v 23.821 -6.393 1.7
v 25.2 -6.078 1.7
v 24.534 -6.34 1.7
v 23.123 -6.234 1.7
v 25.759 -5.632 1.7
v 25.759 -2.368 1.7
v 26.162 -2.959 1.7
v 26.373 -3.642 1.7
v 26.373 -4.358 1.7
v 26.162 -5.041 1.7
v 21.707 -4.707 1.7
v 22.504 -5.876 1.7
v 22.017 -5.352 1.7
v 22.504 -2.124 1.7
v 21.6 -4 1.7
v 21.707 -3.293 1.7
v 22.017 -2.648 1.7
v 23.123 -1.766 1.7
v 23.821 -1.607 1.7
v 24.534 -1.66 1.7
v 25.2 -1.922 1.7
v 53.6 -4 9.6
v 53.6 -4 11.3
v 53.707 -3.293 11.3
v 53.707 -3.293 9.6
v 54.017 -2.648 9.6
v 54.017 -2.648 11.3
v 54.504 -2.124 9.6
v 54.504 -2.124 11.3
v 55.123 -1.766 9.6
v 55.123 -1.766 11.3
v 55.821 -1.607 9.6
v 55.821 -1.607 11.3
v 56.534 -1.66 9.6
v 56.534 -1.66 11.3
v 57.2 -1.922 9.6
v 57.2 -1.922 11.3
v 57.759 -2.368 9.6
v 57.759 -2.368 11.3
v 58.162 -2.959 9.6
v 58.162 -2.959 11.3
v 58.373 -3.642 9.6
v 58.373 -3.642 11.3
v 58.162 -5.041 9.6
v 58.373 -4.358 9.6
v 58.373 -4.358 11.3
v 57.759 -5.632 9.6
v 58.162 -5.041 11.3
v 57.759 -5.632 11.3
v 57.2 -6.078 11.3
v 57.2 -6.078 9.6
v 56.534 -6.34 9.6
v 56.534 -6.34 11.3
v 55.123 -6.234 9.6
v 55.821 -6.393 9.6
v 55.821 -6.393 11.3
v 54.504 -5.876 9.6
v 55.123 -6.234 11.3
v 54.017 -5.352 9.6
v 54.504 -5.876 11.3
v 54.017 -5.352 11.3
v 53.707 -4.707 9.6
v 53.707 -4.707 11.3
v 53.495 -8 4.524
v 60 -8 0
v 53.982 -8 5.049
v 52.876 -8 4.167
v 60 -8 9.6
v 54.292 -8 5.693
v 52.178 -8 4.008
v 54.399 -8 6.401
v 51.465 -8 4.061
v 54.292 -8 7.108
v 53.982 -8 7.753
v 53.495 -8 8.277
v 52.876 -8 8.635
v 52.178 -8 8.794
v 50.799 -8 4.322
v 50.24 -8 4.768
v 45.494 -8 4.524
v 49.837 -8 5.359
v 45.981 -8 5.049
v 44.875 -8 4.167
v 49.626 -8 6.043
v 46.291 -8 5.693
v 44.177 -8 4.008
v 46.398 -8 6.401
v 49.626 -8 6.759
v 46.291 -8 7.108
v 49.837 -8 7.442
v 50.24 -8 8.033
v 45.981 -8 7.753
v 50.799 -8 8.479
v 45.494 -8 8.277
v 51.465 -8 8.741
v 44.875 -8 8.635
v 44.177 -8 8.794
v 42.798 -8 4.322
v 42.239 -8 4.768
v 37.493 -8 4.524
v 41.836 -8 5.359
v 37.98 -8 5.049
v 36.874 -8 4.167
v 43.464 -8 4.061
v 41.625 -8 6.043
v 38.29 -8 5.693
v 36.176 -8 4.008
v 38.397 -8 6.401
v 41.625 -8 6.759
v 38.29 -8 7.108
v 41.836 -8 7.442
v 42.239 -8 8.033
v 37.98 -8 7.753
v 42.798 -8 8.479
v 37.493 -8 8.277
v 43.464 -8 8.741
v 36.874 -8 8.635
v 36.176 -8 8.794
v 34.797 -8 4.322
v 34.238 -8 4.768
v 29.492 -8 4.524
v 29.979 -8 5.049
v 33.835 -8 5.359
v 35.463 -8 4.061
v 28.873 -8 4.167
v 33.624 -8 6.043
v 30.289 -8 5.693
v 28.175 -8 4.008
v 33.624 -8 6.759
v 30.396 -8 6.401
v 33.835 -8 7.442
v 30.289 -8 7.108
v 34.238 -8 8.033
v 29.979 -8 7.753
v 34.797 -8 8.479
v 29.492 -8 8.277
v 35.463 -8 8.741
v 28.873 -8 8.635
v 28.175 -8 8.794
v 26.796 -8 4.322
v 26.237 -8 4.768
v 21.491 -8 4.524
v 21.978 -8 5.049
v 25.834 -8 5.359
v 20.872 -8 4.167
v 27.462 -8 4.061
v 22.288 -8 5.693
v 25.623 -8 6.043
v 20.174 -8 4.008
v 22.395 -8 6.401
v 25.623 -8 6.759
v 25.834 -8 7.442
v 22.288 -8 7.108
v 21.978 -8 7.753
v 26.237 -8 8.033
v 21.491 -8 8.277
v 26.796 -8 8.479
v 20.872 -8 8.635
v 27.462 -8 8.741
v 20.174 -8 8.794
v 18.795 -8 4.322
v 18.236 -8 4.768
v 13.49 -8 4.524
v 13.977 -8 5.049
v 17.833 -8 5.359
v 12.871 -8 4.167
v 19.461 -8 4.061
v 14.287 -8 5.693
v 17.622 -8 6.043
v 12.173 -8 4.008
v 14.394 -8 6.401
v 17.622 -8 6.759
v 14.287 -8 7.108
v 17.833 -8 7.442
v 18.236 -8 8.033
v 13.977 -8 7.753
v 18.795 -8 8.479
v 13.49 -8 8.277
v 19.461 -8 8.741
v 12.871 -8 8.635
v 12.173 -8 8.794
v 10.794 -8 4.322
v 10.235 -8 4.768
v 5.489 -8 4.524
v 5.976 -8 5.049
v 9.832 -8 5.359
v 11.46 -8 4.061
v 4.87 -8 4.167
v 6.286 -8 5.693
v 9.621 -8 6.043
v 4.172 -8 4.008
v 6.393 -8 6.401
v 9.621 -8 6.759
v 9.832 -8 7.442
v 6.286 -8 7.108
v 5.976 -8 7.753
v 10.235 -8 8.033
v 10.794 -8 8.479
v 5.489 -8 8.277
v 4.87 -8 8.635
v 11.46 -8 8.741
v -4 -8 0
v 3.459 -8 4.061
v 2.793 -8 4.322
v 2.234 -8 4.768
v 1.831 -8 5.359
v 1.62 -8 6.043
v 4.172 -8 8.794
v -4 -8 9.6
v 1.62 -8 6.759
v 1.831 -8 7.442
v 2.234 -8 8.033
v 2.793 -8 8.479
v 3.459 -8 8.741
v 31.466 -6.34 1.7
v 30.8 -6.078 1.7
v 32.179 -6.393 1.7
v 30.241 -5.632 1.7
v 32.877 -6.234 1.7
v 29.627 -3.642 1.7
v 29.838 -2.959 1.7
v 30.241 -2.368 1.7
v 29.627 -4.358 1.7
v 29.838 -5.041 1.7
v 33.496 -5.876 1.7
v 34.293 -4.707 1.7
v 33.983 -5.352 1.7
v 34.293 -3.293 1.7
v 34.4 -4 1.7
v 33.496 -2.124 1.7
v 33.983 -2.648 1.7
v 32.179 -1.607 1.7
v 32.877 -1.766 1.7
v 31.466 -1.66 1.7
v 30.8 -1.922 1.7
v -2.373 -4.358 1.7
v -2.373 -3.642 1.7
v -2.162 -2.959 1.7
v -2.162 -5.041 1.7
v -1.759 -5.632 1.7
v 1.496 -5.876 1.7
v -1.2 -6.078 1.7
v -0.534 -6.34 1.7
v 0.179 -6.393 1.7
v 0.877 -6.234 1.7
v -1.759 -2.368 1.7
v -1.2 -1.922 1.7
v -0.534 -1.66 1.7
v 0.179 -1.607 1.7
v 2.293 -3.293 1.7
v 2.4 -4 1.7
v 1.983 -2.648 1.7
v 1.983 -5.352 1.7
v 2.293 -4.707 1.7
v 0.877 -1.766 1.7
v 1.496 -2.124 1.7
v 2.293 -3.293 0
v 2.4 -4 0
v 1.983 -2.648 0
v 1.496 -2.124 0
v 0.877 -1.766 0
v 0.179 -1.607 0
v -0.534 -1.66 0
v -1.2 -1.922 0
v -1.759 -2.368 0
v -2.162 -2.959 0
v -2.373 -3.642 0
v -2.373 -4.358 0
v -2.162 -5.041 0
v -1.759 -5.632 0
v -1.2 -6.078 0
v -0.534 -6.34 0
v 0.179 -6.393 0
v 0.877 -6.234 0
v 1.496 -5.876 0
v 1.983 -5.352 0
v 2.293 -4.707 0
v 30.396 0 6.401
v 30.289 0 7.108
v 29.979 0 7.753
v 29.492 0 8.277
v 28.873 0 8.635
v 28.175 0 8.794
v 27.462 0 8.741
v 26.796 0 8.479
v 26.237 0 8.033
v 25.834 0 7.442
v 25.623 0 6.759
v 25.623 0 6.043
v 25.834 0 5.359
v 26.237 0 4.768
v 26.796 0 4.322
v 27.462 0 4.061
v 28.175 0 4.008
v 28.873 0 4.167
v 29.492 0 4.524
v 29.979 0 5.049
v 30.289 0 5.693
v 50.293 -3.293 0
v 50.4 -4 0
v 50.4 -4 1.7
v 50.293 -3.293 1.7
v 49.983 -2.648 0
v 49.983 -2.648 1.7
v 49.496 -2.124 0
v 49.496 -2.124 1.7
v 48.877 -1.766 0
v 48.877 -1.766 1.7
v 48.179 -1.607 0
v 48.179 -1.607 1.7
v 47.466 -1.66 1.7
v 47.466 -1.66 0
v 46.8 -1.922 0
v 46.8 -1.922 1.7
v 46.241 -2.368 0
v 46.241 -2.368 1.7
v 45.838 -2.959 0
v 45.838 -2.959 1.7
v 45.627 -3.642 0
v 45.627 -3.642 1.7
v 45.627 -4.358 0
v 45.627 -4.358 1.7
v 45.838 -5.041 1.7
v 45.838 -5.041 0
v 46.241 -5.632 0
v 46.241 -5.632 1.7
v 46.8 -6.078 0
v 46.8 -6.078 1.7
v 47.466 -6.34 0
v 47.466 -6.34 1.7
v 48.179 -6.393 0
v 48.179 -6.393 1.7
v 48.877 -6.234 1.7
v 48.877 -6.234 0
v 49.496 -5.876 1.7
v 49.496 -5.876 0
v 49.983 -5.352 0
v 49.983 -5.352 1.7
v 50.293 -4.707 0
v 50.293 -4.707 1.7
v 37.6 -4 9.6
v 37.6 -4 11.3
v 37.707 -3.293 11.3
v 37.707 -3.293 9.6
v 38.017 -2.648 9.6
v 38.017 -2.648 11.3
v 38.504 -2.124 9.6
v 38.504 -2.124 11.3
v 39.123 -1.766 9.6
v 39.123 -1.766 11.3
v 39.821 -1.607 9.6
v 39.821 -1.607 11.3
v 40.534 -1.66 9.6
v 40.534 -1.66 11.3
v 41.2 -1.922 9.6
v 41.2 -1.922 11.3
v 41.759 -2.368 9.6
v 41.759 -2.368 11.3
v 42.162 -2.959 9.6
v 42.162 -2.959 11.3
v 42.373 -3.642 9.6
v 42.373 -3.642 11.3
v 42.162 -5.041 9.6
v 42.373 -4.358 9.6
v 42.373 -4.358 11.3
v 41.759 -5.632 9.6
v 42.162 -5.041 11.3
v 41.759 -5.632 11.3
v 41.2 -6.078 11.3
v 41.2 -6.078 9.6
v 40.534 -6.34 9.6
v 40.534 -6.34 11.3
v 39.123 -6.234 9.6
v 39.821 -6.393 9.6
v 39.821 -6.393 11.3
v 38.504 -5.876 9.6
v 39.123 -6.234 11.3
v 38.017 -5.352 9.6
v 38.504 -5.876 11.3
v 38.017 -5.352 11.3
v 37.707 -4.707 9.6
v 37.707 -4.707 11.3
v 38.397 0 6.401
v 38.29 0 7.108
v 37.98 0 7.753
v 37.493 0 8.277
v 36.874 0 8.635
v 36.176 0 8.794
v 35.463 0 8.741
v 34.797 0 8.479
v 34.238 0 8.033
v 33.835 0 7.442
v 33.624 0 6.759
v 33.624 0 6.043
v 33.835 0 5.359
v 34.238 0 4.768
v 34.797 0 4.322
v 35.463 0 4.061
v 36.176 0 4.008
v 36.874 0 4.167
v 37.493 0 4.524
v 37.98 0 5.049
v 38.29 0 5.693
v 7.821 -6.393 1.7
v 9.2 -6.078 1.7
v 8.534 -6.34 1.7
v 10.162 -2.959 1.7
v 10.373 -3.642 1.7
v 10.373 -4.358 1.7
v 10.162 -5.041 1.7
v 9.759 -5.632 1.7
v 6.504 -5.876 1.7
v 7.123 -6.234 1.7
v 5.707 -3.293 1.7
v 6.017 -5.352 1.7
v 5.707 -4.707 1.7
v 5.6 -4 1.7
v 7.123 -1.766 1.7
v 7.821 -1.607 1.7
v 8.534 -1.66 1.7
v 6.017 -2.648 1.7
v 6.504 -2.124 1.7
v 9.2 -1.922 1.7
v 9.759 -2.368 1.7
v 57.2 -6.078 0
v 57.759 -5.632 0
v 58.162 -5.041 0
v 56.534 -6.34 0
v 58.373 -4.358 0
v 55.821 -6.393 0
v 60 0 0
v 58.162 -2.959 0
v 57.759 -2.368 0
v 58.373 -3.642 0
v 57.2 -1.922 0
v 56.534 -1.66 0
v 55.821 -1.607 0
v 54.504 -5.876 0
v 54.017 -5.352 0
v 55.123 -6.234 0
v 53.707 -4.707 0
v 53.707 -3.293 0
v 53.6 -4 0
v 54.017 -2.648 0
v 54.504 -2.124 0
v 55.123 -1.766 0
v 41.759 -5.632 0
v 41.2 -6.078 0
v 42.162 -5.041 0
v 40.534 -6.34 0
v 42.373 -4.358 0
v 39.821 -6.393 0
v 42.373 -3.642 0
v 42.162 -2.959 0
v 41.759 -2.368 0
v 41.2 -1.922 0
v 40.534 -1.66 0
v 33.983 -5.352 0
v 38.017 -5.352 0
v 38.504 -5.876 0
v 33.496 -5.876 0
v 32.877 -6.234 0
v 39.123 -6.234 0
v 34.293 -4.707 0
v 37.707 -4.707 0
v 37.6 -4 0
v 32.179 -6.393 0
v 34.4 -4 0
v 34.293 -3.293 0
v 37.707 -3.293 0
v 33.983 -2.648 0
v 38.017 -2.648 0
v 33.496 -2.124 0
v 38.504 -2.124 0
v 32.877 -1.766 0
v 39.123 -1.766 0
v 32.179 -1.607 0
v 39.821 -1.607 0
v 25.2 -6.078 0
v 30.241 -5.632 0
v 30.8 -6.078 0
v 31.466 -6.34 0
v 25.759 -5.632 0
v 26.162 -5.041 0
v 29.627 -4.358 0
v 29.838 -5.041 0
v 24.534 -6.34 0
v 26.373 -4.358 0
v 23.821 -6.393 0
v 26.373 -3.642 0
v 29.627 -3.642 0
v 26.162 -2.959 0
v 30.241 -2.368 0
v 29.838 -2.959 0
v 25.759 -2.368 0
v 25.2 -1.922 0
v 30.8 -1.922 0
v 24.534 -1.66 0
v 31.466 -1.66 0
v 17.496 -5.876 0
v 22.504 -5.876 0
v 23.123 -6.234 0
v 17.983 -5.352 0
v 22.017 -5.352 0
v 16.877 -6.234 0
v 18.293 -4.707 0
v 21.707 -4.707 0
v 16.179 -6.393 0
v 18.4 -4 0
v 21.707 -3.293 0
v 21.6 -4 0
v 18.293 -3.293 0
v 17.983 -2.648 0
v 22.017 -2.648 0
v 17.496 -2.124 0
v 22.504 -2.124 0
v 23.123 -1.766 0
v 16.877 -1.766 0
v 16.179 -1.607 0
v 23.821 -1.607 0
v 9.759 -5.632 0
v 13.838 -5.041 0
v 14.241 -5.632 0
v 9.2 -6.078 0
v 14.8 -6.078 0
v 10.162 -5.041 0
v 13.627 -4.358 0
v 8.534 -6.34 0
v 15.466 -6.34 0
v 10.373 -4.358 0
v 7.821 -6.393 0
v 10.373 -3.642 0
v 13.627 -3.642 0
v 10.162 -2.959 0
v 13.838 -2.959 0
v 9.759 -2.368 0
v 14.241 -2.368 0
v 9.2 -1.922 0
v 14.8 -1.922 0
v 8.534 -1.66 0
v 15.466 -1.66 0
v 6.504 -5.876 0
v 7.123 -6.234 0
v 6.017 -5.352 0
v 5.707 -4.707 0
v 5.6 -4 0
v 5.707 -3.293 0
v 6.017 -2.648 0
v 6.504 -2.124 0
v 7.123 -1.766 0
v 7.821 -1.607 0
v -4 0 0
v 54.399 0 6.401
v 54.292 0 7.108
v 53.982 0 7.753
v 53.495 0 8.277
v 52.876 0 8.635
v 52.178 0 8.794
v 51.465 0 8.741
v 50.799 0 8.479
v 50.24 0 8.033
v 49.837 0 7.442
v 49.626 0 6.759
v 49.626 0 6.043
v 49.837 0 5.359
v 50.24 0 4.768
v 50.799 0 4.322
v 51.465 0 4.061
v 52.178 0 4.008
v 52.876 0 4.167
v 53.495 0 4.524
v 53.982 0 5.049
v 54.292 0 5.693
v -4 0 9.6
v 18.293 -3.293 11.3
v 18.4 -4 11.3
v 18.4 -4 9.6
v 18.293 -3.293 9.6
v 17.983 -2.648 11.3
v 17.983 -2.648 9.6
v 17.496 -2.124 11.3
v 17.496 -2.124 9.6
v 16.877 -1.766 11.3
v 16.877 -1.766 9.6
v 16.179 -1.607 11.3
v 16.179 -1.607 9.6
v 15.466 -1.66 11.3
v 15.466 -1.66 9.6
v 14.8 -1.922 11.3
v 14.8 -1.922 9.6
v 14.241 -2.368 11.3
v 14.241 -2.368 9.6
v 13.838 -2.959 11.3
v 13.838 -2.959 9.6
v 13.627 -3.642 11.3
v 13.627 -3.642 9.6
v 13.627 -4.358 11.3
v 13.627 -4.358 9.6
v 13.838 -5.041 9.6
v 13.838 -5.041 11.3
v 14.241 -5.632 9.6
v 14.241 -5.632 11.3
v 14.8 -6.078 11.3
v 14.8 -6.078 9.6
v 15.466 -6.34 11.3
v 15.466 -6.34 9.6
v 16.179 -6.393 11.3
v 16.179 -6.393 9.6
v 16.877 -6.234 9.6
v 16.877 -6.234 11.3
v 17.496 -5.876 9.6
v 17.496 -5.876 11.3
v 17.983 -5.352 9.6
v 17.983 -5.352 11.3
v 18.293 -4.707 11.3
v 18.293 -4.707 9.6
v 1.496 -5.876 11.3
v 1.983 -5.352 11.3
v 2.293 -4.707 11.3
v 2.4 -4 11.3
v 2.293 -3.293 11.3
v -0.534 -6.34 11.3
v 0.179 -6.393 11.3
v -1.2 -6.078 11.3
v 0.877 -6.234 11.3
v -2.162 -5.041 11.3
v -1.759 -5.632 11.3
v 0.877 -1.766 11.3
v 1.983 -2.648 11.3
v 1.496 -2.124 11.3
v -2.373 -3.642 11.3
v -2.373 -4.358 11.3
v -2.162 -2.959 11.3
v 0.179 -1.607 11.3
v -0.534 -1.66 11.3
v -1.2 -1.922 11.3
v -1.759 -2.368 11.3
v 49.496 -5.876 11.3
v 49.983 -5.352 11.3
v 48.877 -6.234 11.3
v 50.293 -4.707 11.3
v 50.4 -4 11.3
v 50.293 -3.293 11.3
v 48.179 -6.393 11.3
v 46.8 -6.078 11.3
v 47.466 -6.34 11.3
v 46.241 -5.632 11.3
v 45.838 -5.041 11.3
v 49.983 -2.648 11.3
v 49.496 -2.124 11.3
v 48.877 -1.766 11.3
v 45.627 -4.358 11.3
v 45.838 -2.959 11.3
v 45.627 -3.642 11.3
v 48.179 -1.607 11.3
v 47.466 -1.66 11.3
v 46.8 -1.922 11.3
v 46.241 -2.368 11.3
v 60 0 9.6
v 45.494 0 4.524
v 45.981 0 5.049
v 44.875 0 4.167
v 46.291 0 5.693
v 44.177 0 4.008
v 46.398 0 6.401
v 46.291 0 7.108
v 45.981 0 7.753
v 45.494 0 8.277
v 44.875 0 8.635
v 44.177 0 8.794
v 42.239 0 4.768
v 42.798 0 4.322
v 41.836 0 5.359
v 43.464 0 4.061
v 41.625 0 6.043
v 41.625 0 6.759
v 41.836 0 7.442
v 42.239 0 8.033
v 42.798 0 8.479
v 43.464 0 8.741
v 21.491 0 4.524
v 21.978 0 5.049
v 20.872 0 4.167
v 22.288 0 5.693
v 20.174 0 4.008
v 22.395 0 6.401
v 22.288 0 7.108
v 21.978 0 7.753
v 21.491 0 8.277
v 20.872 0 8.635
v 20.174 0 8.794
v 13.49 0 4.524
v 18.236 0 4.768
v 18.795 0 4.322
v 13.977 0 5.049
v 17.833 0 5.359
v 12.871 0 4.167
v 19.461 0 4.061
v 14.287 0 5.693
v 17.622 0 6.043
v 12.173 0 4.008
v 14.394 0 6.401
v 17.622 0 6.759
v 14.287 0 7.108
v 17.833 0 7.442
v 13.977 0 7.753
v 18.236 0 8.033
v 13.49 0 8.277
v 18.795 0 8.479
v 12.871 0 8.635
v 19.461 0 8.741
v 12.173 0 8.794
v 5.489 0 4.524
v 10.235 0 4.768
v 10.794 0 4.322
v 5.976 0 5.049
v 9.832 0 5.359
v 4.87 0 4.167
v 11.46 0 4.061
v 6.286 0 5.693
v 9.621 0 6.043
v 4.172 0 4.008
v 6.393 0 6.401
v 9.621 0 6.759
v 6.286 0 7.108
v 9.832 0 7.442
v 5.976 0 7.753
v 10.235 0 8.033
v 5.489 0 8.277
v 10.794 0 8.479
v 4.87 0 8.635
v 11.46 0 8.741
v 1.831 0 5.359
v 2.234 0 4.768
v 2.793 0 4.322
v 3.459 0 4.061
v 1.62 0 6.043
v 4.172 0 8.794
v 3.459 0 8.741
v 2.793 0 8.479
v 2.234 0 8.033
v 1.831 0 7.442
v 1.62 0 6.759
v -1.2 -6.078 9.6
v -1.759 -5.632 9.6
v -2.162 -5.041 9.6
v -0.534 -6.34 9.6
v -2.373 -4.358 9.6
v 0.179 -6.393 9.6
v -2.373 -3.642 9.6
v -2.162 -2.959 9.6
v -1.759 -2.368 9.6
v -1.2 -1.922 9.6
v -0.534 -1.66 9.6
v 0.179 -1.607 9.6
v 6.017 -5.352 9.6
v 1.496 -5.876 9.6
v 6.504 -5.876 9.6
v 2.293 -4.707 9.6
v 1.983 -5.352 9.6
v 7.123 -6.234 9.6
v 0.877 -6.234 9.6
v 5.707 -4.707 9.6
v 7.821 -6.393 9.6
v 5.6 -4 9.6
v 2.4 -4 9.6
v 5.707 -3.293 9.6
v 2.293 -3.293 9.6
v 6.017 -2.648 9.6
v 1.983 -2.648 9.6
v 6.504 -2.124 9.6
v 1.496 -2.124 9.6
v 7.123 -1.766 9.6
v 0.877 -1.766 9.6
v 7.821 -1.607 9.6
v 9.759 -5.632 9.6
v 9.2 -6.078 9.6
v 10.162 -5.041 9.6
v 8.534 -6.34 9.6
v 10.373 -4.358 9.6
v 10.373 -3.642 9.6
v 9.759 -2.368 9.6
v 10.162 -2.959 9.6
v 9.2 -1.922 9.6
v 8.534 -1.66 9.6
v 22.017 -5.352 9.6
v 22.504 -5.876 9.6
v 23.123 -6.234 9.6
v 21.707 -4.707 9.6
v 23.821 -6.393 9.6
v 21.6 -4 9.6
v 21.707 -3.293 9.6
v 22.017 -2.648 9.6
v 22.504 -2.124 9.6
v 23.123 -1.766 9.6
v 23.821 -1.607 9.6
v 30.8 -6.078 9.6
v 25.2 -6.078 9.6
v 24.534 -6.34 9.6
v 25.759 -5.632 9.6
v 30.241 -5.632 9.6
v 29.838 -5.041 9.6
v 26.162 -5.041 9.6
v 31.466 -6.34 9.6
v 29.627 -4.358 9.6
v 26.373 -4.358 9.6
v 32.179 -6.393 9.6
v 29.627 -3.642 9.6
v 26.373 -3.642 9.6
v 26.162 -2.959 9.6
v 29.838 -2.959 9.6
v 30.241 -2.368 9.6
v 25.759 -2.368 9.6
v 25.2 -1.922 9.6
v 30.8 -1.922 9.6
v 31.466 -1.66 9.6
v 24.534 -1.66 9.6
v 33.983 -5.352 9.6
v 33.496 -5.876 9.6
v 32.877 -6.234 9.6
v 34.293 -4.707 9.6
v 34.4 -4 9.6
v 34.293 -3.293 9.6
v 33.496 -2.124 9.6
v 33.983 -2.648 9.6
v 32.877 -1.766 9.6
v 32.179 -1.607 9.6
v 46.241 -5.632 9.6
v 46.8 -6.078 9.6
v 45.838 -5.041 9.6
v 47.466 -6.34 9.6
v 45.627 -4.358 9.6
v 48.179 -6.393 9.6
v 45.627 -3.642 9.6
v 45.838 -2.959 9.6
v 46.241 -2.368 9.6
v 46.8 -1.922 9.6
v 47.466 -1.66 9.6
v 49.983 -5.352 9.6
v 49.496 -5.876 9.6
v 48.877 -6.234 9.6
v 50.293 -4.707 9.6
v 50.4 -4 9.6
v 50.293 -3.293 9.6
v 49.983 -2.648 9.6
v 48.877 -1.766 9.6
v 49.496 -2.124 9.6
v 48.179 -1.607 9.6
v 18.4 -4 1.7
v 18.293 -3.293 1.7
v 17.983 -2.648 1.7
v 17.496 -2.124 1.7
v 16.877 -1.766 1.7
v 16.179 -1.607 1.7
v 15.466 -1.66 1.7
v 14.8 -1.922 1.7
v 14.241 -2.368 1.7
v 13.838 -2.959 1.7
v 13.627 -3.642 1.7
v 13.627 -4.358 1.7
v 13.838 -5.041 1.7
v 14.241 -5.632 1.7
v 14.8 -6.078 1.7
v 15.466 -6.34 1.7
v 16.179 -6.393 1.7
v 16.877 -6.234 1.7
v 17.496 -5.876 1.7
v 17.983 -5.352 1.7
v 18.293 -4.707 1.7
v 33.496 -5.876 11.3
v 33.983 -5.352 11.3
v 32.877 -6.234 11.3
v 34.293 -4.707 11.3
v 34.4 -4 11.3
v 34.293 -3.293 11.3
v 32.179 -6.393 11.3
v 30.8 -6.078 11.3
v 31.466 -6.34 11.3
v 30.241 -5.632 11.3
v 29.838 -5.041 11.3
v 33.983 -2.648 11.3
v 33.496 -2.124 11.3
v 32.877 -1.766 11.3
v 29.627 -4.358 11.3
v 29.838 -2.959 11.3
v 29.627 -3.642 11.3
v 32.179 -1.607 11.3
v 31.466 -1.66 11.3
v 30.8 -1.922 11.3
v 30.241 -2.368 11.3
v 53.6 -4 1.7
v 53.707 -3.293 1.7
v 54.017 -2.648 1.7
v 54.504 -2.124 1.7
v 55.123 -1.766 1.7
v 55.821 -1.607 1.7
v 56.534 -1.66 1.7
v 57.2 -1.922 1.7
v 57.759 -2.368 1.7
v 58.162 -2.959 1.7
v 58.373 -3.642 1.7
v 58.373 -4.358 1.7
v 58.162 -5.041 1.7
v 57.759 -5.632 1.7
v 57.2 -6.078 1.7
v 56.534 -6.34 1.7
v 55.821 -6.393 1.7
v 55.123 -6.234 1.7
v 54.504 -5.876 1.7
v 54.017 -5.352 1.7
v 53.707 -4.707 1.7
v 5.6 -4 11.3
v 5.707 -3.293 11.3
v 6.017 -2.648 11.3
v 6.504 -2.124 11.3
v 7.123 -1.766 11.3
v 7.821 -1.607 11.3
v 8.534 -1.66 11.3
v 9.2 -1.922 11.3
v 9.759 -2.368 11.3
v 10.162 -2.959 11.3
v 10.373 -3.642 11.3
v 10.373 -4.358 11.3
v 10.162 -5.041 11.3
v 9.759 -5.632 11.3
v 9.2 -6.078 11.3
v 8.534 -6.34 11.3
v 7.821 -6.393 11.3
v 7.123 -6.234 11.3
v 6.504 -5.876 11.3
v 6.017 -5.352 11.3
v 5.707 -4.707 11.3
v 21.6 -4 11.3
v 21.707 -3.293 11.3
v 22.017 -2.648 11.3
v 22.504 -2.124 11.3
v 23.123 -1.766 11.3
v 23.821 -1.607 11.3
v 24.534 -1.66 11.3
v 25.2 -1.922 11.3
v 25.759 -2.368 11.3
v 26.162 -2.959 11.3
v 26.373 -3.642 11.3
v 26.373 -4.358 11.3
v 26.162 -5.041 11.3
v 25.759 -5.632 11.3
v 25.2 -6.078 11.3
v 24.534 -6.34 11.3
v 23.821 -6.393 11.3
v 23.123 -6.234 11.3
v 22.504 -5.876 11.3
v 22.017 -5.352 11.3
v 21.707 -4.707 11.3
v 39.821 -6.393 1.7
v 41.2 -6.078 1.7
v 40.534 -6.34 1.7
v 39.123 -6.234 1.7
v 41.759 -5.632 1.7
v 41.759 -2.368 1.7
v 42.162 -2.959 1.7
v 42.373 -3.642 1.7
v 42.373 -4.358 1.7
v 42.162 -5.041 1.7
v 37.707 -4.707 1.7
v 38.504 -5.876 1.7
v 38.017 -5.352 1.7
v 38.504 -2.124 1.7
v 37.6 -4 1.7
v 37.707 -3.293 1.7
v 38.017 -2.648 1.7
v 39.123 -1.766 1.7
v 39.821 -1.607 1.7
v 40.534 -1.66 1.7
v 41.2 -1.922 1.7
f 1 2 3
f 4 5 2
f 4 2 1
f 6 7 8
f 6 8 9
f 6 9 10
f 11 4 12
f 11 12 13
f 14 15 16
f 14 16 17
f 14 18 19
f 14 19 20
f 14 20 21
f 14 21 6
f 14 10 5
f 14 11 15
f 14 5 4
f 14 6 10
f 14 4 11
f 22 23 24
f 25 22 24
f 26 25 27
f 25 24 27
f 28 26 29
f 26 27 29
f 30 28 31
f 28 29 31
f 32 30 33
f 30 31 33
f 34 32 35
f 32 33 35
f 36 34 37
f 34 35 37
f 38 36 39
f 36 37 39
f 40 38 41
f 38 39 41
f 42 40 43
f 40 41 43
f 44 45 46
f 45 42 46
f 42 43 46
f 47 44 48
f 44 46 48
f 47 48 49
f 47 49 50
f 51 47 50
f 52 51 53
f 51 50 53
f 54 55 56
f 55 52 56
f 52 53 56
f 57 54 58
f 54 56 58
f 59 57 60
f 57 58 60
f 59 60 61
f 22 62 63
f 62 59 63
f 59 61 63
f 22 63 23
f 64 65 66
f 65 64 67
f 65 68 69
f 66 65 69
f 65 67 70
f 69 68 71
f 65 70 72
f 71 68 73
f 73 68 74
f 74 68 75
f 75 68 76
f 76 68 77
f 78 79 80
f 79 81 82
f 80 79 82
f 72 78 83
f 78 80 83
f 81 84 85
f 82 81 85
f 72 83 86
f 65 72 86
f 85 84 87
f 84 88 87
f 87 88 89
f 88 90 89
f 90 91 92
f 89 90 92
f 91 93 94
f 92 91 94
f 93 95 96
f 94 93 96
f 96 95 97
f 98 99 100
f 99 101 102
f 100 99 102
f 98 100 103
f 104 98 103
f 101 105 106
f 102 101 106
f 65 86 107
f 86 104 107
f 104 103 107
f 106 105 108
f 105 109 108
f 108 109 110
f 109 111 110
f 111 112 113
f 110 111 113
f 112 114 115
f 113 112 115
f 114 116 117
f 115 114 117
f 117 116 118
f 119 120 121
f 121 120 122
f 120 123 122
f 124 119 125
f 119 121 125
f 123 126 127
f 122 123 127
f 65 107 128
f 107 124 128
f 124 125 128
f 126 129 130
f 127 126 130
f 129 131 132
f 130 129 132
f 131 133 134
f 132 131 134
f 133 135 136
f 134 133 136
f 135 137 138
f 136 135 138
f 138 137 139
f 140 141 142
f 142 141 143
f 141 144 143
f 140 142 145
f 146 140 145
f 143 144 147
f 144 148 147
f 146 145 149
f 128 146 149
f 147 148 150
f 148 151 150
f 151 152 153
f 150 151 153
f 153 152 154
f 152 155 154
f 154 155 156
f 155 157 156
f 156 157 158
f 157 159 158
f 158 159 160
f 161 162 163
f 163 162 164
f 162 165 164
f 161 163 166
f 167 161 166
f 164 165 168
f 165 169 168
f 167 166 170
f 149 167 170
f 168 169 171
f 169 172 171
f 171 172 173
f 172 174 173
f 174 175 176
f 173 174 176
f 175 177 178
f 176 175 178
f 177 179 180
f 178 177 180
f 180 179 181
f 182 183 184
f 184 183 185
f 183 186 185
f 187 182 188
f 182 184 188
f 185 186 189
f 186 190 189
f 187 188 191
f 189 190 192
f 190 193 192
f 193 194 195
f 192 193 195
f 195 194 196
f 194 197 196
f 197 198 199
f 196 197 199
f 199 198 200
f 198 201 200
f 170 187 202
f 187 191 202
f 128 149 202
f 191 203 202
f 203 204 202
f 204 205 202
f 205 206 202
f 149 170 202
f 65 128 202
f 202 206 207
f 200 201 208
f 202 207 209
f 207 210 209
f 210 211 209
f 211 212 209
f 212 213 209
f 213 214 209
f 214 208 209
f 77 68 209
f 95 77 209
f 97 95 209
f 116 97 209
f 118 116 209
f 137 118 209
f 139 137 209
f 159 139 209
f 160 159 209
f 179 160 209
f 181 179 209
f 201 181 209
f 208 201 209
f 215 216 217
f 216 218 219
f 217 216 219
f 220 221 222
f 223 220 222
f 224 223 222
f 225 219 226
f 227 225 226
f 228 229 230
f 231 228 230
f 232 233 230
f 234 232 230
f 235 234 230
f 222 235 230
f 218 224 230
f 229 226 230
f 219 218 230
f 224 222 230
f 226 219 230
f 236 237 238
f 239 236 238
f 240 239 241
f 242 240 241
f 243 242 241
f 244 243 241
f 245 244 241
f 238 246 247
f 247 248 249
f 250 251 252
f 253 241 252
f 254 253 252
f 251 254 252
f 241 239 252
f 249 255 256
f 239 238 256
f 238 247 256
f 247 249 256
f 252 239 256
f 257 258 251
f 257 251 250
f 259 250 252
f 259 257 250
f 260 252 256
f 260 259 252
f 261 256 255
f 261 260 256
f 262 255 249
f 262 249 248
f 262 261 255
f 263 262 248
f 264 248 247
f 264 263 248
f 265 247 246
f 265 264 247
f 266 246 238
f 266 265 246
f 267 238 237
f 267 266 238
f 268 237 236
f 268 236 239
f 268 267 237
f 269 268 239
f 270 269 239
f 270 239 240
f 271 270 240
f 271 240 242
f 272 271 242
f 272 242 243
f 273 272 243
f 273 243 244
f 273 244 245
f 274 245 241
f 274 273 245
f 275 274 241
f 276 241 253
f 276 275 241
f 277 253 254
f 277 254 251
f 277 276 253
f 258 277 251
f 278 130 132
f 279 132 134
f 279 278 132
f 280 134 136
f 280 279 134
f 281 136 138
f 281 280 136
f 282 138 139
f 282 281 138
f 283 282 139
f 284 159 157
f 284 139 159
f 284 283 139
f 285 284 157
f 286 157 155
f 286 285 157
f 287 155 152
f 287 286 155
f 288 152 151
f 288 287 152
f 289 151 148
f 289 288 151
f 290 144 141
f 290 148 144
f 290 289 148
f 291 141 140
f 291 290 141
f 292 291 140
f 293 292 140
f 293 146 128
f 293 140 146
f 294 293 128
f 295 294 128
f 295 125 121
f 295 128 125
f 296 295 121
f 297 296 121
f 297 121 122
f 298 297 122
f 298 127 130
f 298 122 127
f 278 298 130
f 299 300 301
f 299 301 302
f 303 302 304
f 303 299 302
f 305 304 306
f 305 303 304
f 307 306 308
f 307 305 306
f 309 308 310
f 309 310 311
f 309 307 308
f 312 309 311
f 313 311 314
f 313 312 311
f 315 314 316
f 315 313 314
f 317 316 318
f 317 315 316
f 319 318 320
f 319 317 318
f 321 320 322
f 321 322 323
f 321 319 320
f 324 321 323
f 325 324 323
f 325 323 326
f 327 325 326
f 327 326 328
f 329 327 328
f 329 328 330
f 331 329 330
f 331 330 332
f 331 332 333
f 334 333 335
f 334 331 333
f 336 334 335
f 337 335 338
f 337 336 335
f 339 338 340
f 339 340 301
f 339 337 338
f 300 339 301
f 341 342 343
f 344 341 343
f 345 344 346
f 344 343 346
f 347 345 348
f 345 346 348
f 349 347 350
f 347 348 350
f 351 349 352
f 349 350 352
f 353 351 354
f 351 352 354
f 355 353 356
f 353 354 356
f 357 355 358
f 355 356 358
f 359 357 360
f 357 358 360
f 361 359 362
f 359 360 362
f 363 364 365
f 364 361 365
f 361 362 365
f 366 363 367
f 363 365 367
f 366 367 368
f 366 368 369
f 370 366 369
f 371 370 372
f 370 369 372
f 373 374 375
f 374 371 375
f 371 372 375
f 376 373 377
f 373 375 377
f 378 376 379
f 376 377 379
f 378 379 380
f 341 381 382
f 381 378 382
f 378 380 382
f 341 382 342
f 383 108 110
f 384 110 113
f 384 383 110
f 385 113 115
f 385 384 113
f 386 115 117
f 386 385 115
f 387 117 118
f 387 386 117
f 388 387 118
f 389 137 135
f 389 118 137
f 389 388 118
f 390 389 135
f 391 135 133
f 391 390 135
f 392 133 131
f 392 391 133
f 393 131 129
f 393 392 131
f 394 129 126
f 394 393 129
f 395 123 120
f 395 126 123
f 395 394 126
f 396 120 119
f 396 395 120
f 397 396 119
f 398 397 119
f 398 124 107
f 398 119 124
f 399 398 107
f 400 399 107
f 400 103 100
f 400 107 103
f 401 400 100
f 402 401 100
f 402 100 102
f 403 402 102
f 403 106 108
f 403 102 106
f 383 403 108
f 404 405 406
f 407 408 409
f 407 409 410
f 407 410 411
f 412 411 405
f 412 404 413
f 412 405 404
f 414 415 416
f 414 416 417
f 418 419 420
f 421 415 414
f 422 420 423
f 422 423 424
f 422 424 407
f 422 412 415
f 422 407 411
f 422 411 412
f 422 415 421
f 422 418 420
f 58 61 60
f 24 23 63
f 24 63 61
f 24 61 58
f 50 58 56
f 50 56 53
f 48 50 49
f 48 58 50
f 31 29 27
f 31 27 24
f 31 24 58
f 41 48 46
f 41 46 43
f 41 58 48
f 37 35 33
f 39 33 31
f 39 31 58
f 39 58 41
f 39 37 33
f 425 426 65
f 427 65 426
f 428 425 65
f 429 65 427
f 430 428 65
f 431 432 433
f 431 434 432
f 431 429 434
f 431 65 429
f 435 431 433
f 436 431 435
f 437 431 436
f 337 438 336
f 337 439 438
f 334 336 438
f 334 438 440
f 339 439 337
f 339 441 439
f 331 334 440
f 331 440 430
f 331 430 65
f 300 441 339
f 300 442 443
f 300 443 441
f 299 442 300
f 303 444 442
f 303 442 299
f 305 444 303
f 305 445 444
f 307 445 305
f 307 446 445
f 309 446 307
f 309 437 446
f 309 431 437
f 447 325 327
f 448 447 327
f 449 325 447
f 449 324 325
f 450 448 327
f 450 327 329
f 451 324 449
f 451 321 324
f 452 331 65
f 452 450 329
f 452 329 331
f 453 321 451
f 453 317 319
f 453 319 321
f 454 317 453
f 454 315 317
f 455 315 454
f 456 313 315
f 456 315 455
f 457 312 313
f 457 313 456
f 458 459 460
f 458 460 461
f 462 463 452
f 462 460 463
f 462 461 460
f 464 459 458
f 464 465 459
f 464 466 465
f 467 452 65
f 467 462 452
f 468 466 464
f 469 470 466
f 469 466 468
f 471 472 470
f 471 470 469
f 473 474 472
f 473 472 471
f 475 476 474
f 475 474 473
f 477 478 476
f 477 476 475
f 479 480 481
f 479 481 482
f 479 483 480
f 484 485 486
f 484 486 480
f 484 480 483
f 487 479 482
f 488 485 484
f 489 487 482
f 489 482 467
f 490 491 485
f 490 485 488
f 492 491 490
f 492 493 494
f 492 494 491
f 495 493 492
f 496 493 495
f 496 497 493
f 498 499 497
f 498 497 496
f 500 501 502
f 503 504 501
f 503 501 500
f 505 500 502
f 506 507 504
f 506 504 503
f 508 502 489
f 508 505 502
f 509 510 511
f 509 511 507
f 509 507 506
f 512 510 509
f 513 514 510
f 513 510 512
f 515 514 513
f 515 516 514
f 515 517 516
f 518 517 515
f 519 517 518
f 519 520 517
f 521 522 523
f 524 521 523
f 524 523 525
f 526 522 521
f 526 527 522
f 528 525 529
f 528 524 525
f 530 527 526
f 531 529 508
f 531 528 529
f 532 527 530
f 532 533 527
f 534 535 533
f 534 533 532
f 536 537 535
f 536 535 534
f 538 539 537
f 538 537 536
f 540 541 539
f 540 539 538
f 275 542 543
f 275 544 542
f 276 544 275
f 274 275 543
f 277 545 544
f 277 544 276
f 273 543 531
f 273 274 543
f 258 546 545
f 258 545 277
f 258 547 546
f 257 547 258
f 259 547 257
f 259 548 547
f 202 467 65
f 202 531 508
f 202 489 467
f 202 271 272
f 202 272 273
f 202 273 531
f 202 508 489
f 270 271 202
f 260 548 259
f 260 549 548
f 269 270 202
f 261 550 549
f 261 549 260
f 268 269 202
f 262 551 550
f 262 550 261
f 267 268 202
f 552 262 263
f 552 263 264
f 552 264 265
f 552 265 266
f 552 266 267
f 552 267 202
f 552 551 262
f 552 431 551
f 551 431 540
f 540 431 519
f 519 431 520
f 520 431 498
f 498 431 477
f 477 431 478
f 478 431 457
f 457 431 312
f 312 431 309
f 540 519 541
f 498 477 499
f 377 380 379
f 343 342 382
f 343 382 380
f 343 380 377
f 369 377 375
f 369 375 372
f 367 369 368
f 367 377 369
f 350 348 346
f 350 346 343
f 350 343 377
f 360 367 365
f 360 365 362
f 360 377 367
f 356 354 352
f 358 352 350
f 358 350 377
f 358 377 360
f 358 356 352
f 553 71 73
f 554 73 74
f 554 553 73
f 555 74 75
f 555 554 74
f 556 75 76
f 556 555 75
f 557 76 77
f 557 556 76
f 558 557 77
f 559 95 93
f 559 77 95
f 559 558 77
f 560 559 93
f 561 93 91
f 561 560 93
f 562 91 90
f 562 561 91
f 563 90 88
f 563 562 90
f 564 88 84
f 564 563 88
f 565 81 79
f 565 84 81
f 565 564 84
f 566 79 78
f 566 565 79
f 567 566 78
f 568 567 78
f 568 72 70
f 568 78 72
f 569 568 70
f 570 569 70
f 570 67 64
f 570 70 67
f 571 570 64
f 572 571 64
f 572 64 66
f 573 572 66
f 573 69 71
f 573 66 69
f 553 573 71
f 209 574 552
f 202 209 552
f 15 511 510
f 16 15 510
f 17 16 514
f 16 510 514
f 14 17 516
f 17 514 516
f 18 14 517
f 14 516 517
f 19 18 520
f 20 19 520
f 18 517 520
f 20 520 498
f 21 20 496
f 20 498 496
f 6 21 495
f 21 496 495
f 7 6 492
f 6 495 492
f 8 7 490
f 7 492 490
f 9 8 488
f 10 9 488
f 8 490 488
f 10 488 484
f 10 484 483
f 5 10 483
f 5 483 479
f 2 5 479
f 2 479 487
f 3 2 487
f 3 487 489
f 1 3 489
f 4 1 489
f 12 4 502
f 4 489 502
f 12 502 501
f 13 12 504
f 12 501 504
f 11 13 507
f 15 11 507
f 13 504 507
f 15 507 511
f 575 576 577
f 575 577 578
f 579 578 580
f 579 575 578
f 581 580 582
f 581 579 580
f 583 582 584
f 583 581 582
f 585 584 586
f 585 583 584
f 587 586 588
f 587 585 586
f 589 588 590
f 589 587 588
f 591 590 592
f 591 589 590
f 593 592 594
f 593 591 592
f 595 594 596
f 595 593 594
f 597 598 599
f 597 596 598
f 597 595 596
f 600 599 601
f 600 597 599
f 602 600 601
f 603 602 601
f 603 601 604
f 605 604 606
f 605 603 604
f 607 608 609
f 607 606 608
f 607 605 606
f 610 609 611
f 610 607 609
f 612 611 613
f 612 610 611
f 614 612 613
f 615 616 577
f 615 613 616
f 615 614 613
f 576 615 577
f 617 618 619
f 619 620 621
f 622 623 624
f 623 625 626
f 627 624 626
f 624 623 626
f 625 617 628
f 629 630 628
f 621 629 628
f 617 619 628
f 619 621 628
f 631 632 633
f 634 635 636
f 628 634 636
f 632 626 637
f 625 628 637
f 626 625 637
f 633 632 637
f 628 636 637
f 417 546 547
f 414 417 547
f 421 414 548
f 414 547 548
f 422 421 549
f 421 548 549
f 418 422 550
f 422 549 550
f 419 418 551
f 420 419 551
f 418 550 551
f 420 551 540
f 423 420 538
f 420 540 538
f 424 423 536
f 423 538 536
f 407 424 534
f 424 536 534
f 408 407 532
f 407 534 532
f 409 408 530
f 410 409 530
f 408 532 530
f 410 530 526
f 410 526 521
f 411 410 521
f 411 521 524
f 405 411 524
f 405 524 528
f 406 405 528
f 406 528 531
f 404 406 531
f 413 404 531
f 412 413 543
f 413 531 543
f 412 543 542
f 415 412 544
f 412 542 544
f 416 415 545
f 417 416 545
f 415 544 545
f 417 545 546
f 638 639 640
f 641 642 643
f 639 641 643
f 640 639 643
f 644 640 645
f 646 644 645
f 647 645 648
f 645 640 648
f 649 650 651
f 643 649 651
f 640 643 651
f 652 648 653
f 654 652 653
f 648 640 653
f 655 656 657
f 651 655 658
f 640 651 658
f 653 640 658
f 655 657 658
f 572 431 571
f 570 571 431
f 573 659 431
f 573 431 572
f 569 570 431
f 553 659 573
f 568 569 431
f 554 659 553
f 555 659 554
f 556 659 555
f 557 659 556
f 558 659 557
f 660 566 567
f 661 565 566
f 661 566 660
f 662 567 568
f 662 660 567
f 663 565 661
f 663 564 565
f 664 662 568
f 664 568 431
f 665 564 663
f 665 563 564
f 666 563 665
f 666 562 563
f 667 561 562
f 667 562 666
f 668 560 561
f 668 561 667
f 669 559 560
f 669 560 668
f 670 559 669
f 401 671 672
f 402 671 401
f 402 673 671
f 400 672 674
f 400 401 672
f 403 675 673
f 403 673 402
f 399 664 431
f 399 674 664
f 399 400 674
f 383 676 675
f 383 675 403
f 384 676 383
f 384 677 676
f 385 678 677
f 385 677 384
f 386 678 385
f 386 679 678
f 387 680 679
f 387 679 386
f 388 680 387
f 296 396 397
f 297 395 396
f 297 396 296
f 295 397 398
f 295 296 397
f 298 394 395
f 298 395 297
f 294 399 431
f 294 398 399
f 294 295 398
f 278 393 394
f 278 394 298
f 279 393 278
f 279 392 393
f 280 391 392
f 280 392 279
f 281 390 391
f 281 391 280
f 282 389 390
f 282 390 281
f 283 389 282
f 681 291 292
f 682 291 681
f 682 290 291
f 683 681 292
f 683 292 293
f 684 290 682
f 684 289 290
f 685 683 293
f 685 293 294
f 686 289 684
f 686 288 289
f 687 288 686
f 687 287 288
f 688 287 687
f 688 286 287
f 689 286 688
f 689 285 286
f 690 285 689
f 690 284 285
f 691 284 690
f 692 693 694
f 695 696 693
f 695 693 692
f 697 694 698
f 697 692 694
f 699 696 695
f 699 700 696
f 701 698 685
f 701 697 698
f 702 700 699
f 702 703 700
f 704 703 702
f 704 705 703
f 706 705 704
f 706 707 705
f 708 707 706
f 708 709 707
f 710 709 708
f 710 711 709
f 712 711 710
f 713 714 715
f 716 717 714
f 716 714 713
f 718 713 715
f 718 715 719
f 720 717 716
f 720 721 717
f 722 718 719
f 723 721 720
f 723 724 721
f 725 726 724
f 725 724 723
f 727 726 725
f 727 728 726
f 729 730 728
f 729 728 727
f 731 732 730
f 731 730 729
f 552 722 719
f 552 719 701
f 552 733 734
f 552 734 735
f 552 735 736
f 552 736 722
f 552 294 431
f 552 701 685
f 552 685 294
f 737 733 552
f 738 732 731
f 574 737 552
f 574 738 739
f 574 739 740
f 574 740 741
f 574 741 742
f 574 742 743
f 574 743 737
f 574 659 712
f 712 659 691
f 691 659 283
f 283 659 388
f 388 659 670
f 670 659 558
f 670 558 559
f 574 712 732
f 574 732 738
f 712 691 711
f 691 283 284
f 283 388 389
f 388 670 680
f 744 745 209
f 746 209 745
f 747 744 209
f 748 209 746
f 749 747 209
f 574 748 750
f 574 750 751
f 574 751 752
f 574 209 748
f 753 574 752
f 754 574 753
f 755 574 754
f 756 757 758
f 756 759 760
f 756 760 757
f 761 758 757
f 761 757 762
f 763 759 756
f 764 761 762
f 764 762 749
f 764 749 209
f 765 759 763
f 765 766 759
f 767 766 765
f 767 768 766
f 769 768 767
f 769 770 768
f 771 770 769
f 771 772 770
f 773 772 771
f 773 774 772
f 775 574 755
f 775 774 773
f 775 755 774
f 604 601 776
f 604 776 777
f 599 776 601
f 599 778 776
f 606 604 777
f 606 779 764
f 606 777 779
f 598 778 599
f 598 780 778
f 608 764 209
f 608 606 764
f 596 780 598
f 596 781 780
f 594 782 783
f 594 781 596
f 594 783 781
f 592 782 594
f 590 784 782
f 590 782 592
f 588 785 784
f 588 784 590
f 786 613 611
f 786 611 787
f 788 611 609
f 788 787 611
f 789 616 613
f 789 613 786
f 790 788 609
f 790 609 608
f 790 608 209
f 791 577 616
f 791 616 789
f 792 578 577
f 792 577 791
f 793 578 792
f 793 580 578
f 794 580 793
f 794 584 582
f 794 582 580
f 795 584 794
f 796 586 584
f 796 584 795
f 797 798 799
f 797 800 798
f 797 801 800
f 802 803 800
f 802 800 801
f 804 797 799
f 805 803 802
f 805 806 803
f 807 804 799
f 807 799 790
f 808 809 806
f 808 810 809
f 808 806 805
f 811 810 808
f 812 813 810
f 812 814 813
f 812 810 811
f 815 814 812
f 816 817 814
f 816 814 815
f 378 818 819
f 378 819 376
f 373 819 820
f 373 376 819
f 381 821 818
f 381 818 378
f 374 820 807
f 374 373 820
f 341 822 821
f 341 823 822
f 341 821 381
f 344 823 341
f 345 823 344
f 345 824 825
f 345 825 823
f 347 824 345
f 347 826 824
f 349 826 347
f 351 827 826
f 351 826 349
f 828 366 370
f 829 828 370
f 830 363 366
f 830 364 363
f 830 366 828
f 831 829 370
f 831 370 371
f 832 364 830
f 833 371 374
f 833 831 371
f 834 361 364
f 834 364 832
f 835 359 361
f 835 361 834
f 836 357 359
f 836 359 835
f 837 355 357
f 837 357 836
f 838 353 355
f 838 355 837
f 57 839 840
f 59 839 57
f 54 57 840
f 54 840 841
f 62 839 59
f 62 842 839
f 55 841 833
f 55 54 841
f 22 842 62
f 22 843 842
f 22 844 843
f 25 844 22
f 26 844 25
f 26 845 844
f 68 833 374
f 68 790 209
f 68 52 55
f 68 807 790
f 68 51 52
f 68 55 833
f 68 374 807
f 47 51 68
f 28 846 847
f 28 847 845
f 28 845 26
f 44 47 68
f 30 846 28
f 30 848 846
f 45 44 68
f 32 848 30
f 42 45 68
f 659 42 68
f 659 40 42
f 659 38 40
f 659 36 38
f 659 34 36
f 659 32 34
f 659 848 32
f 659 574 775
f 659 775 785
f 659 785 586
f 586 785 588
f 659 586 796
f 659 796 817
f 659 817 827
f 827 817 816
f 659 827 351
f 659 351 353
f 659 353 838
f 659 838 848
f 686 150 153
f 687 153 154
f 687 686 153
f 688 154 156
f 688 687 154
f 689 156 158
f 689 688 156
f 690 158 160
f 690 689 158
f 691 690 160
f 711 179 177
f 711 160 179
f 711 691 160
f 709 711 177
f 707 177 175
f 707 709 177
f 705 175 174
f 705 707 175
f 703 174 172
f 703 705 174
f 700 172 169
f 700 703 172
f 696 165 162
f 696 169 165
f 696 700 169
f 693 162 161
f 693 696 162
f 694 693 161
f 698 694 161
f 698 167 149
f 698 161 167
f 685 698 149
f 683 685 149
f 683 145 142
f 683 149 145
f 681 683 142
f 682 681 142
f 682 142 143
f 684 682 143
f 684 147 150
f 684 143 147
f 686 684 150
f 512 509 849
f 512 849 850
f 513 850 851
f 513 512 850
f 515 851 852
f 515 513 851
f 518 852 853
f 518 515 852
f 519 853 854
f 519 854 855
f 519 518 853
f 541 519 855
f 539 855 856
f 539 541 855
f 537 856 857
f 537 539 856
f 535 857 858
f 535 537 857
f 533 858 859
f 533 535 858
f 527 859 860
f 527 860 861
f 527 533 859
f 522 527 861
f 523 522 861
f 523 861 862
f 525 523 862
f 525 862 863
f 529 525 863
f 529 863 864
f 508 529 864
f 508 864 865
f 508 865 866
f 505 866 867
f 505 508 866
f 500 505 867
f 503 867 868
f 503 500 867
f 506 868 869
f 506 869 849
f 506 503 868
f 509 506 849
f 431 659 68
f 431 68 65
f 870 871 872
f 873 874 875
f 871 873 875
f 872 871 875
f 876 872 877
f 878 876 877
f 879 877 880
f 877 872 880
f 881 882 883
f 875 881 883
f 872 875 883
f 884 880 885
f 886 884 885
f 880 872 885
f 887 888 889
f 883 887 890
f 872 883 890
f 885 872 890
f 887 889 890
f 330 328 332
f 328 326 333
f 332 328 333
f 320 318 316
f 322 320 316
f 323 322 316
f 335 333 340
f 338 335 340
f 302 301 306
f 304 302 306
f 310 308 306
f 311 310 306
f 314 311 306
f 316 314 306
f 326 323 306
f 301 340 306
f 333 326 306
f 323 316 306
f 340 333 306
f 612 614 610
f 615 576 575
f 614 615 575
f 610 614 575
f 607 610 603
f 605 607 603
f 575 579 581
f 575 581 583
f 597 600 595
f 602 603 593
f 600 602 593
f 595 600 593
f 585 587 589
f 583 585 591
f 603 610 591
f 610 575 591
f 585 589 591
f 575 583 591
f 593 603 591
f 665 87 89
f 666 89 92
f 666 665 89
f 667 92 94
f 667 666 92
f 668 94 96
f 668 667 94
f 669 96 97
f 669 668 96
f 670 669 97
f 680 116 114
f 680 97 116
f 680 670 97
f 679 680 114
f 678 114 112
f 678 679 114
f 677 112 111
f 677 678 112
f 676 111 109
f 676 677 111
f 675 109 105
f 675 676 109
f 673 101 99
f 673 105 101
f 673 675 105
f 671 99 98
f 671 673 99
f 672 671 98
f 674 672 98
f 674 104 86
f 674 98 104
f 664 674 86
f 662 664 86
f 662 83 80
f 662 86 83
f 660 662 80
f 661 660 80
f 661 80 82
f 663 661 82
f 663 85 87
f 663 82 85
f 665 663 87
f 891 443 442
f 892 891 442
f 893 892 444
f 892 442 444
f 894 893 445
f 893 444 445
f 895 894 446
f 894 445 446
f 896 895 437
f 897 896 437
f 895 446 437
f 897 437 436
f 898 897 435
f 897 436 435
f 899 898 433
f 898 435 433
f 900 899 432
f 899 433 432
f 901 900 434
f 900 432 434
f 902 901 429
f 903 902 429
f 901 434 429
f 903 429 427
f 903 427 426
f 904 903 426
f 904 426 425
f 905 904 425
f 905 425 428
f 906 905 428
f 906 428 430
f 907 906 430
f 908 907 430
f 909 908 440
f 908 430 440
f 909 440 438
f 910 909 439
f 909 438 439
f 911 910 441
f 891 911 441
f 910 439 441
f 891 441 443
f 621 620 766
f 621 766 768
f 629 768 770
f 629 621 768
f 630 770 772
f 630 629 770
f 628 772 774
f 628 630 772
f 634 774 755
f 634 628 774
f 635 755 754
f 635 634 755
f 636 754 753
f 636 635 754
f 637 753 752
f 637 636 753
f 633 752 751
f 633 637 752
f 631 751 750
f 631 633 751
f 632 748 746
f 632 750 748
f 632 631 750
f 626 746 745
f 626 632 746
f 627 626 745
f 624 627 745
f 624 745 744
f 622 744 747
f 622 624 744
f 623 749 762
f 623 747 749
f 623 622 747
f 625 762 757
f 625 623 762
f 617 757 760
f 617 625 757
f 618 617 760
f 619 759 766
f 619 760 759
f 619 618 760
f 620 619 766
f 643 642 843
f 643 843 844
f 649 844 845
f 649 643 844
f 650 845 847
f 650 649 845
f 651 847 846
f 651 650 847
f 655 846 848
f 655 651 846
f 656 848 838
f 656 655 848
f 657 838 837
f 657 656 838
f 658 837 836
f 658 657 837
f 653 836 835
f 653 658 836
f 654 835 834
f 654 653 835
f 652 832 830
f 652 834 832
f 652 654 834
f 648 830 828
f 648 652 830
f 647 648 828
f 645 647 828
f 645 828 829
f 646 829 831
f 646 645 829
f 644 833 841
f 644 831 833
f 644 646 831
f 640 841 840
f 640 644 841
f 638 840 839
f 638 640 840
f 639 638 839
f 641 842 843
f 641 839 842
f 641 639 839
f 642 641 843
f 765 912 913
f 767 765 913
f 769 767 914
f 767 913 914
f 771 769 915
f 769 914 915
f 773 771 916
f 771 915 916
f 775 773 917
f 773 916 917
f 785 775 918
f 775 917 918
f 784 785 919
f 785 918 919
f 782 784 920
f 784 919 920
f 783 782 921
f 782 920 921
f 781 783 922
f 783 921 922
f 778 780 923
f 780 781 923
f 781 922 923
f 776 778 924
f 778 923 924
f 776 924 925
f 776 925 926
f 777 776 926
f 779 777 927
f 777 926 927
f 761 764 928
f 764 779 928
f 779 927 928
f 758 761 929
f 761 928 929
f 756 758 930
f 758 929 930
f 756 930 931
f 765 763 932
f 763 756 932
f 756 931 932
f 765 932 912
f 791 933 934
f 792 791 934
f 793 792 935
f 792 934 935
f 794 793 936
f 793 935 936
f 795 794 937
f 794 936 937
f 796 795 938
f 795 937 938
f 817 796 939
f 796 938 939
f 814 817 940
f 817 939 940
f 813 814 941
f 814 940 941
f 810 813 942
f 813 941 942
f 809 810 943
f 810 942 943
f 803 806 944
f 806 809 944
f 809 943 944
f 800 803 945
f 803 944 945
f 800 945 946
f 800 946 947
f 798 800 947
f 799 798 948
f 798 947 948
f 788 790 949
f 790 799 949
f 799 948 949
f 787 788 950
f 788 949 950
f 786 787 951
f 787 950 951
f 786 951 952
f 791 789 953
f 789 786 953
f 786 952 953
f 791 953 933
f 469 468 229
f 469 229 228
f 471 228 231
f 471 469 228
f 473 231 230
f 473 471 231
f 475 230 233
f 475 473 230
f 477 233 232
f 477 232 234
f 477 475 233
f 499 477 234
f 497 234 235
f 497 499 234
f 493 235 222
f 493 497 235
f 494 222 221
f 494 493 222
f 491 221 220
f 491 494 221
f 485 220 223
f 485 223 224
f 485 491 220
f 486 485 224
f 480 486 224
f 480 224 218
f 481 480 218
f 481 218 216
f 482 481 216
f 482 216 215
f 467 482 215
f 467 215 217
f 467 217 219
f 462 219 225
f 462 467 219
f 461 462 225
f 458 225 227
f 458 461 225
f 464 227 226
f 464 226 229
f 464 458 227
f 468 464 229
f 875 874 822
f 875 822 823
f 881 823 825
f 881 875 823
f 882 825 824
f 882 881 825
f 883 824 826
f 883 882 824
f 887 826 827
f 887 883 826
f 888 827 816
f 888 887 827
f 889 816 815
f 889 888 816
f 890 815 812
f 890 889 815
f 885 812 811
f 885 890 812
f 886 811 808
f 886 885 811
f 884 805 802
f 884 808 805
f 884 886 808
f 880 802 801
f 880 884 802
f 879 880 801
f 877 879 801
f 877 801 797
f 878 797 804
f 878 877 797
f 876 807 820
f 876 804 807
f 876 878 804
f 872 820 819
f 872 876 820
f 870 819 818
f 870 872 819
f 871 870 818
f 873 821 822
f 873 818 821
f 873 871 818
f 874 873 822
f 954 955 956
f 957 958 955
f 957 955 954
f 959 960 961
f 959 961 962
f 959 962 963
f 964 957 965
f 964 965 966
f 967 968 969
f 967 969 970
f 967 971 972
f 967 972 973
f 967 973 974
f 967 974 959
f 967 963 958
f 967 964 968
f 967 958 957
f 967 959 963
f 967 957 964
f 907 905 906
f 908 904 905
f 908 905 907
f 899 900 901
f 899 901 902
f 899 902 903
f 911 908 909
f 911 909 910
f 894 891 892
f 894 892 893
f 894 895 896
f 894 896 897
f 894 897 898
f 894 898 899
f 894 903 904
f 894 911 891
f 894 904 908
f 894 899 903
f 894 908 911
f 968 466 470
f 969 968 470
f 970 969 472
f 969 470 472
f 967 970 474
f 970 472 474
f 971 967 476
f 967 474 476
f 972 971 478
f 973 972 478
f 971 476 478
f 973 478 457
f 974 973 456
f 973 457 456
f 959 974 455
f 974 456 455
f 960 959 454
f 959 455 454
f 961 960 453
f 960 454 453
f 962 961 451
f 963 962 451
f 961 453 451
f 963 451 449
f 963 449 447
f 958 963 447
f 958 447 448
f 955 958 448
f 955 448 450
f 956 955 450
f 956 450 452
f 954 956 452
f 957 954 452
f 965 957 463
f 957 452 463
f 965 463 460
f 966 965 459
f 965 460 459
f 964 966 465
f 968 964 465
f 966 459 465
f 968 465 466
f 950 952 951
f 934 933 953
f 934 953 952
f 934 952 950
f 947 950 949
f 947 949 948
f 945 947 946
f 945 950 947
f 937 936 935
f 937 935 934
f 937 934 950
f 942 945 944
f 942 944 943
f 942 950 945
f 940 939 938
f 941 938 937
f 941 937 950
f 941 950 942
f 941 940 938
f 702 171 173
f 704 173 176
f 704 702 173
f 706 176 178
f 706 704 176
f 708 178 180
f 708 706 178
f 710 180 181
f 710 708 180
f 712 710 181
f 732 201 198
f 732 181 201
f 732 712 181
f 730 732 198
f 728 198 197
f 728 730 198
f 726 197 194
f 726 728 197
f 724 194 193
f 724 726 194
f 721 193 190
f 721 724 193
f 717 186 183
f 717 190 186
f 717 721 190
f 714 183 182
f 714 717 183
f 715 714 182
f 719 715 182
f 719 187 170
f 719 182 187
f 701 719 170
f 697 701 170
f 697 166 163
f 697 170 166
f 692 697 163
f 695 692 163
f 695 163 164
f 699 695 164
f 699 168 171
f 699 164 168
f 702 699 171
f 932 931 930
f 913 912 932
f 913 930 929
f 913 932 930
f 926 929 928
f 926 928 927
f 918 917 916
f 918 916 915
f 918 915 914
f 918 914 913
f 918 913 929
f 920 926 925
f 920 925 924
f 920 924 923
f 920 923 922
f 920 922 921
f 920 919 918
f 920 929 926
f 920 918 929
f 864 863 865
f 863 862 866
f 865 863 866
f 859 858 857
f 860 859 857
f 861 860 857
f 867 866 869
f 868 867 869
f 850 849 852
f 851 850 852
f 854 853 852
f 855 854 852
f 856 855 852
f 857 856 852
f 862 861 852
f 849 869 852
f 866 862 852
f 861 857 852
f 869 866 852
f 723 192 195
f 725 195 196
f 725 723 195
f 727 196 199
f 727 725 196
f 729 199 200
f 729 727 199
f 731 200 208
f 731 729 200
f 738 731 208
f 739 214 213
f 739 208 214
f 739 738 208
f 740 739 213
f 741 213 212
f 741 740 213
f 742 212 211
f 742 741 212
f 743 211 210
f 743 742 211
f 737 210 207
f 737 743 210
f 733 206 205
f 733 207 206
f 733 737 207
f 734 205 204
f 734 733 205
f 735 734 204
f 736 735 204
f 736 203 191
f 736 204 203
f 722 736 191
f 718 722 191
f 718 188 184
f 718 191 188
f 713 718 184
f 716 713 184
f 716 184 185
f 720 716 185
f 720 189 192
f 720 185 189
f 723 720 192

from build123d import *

# Parameters (mm, degrees)
F1_DEPTH  = 8
F3_W      = 8
F3_H      = 8
F3_R      = 2.4
F4_DEPTH  = 1.7
F5_R      = 2.4
F6_DEPTH  = 1.7
F13_R     = 2.4
F14_DEPTH = 25.4


with BuildPart() as f1:
    # F0 (on Front) → F1 (new body)
    with BuildSketch(Plane.XZ):
        Polygon((-2.4, 9.6), (-4, 9.6), (-4, 0), (4, 0), (4, 9.6), (2.4, 9.6), (2.4, 11.3), (-2.4, 11.3), align=None)
    extrude(amount=F1_DEPTH)

    # F3 (on plane+point) → F4 (cut, through all)
    with BuildSketch(Plane.XY.offset(11.3)):
        with Locations((0, -4)):
            Rectangle(F3_W, F3_H)
        with Locations((0, -4)):
            Circle(F3_R, mode=Mode.SUBTRACT)
    extrude(amount=-F4_DEPTH, mode=Mode.SUBTRACT)

    # F5 (on Top) → F6 (cut)
    with BuildSketch(Plane.XY):
        with Locations((0, -4)):
            Circle(F5_R)
    extrude(amount=F6_DEPTH, mode=Mode.SUBTRACT)

    # F8: F1 across plane


with BuildPart() as f1_1:
    add(f1.part)
    add(f1.part.mirror(Plane.YZ.offset(4)))

    # F10: F1 across plane


with BuildPart() as f1_2:
    add(f1_1.part)
    add(f1_1.part.mirror(Plane.YZ.offset(12)))

    # F12: F1 across plane


with BuildPart() as f1_3:
    add(f1_2.part)
    add(f1_2.part.mirror(Plane.YZ.offset(28)))

    # F13 (on Front) → F14 (cut)
    with BuildSketch(Plane.XZ):
        with Locations((51.999, 6.4008)):
            Circle(F13_R)
        with Locations((43.998, 6.4008)):
            Circle(F13_R)
        with Locations((35.997, 6.4008)):
            Circle(F13_R)
        with Locations((27.996, 6.4008)):
            Circle(F13_R)
        with Locations((19.995, 6.4008)):
            Circle(F13_R)
        with Locations((11.994, 6.4008)):
            Circle(F13_R)
        with Locations((3.993, 6.4008)):
            Circle(F13_R)
    extrude(amount=F14_DEPTH, mode=Mode.SUBTRACT)


solid = f1_3.part
